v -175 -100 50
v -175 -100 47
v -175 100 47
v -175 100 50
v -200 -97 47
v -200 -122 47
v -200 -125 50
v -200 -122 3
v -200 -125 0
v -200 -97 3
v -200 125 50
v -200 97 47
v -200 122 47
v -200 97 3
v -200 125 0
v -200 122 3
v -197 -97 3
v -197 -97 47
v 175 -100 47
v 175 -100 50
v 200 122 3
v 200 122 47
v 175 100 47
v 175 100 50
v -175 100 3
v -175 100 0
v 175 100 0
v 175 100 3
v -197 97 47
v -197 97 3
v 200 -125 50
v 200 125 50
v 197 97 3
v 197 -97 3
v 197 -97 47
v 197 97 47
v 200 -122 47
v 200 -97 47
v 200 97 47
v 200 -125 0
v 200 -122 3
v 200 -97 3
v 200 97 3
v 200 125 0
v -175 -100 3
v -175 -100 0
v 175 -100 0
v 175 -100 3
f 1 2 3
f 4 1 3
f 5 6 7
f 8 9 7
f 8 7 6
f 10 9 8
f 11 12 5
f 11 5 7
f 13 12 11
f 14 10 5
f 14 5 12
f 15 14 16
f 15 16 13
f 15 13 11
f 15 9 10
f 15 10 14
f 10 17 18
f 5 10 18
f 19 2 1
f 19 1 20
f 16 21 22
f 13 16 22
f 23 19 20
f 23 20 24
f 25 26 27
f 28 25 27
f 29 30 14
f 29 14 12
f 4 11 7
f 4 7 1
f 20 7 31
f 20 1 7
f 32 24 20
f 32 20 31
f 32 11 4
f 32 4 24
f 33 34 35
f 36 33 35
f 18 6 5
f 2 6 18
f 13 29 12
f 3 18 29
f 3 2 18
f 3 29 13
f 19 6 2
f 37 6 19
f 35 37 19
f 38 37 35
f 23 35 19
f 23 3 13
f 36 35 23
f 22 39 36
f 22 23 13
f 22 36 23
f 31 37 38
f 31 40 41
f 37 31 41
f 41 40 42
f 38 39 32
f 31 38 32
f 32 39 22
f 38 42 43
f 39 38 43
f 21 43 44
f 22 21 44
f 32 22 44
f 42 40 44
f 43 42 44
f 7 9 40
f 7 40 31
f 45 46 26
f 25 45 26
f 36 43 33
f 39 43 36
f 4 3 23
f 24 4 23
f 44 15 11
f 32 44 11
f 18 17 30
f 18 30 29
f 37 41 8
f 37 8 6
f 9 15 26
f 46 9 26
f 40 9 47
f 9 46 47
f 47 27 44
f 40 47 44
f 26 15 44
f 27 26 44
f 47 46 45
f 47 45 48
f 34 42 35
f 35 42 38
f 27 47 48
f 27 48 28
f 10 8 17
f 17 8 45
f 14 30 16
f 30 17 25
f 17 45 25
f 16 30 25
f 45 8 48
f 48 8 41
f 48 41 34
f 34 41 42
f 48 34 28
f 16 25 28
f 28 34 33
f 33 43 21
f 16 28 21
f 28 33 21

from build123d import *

# Parameters (mm, degrees)
F0_W     = 400
F0_H     = 250
F0_W_2   = 350
F0_H_2   = 200
F1_DEPTH = 50
F2_W     = 25
F2_H     = 44
F3_DEPTH = 250
F4_W     = 25
F4_H     = 44
F5_DEPTH = 400
F6_DEPTH = 25
F7_DEPTH = 25
F8_DEPTH = 25
F9_DEPTH = 25


with BuildPart() as f1:
    # F0 (on Top) → F1 (new body)
    with BuildSketch(Plane.XY):
        Rectangle(F0_W, F0_H)
        Rectangle(F0_W_2, F0_H_2, mode=Mode.SUBTRACT)
    extrude(amount=F1_DEPTH)

    # F2 (on face) → F3 (cut, through all)
    with BuildSketch(Plane.XZ.offset(125)):
        with Locations((184.5, 25)):
            Rectangle(F2_W, F2_H)
        with Locations((-184.5, 25)):
            Rectangle(F2_W, F2_H)
    extrude(amount=-F3_DEPTH, mode=Mode.SUBTRACT)

    # F4 (on face) → F5 (cut, through all)
    with BuildSketch(Plane.YZ.offset(200)):
        with Locations((109.5, 25)):
            Rectangle(F4_W, F4_H)
        with Locations((-109.5, 25)):
            Rectangle(F4_W, F4_H)
    extrude(amount=-F5_DEPTH, mode=Mode.SUBTRACT)

    # F6 (add): a face of the model
    f6_faces = [f1.faces().sort_by_distance(p)[0] for p in [
        (172, -123.5, 25),
    ]]
    extrude(f6_faces, amount=F6_DEPTH)

    # F7 (add): a face of the model
    f7_faces = [f1.faces().sort_by_distance(p)[0] for p in [
        (172, 123.5, 25),
    ]]
    extrude(f7_faces, amount=F7_DEPTH)

    # F8 (add): a face of the model
    f8_faces = [f1.faces().sort_by_distance(p)[0] for p in [
        (-172, 123.5, 25),
    ]]
    extrude(f8_faces, amount=F8_DEPTH)

    # F9 (add): a face of the model
    f9_faces = [f1.faces().sort_by_distance(p)[0] for p in [
        (-172, -123.5, 25),
    ]]
    extrude(f9_faces, amount=F9_DEPTH)


solid = f1.part
